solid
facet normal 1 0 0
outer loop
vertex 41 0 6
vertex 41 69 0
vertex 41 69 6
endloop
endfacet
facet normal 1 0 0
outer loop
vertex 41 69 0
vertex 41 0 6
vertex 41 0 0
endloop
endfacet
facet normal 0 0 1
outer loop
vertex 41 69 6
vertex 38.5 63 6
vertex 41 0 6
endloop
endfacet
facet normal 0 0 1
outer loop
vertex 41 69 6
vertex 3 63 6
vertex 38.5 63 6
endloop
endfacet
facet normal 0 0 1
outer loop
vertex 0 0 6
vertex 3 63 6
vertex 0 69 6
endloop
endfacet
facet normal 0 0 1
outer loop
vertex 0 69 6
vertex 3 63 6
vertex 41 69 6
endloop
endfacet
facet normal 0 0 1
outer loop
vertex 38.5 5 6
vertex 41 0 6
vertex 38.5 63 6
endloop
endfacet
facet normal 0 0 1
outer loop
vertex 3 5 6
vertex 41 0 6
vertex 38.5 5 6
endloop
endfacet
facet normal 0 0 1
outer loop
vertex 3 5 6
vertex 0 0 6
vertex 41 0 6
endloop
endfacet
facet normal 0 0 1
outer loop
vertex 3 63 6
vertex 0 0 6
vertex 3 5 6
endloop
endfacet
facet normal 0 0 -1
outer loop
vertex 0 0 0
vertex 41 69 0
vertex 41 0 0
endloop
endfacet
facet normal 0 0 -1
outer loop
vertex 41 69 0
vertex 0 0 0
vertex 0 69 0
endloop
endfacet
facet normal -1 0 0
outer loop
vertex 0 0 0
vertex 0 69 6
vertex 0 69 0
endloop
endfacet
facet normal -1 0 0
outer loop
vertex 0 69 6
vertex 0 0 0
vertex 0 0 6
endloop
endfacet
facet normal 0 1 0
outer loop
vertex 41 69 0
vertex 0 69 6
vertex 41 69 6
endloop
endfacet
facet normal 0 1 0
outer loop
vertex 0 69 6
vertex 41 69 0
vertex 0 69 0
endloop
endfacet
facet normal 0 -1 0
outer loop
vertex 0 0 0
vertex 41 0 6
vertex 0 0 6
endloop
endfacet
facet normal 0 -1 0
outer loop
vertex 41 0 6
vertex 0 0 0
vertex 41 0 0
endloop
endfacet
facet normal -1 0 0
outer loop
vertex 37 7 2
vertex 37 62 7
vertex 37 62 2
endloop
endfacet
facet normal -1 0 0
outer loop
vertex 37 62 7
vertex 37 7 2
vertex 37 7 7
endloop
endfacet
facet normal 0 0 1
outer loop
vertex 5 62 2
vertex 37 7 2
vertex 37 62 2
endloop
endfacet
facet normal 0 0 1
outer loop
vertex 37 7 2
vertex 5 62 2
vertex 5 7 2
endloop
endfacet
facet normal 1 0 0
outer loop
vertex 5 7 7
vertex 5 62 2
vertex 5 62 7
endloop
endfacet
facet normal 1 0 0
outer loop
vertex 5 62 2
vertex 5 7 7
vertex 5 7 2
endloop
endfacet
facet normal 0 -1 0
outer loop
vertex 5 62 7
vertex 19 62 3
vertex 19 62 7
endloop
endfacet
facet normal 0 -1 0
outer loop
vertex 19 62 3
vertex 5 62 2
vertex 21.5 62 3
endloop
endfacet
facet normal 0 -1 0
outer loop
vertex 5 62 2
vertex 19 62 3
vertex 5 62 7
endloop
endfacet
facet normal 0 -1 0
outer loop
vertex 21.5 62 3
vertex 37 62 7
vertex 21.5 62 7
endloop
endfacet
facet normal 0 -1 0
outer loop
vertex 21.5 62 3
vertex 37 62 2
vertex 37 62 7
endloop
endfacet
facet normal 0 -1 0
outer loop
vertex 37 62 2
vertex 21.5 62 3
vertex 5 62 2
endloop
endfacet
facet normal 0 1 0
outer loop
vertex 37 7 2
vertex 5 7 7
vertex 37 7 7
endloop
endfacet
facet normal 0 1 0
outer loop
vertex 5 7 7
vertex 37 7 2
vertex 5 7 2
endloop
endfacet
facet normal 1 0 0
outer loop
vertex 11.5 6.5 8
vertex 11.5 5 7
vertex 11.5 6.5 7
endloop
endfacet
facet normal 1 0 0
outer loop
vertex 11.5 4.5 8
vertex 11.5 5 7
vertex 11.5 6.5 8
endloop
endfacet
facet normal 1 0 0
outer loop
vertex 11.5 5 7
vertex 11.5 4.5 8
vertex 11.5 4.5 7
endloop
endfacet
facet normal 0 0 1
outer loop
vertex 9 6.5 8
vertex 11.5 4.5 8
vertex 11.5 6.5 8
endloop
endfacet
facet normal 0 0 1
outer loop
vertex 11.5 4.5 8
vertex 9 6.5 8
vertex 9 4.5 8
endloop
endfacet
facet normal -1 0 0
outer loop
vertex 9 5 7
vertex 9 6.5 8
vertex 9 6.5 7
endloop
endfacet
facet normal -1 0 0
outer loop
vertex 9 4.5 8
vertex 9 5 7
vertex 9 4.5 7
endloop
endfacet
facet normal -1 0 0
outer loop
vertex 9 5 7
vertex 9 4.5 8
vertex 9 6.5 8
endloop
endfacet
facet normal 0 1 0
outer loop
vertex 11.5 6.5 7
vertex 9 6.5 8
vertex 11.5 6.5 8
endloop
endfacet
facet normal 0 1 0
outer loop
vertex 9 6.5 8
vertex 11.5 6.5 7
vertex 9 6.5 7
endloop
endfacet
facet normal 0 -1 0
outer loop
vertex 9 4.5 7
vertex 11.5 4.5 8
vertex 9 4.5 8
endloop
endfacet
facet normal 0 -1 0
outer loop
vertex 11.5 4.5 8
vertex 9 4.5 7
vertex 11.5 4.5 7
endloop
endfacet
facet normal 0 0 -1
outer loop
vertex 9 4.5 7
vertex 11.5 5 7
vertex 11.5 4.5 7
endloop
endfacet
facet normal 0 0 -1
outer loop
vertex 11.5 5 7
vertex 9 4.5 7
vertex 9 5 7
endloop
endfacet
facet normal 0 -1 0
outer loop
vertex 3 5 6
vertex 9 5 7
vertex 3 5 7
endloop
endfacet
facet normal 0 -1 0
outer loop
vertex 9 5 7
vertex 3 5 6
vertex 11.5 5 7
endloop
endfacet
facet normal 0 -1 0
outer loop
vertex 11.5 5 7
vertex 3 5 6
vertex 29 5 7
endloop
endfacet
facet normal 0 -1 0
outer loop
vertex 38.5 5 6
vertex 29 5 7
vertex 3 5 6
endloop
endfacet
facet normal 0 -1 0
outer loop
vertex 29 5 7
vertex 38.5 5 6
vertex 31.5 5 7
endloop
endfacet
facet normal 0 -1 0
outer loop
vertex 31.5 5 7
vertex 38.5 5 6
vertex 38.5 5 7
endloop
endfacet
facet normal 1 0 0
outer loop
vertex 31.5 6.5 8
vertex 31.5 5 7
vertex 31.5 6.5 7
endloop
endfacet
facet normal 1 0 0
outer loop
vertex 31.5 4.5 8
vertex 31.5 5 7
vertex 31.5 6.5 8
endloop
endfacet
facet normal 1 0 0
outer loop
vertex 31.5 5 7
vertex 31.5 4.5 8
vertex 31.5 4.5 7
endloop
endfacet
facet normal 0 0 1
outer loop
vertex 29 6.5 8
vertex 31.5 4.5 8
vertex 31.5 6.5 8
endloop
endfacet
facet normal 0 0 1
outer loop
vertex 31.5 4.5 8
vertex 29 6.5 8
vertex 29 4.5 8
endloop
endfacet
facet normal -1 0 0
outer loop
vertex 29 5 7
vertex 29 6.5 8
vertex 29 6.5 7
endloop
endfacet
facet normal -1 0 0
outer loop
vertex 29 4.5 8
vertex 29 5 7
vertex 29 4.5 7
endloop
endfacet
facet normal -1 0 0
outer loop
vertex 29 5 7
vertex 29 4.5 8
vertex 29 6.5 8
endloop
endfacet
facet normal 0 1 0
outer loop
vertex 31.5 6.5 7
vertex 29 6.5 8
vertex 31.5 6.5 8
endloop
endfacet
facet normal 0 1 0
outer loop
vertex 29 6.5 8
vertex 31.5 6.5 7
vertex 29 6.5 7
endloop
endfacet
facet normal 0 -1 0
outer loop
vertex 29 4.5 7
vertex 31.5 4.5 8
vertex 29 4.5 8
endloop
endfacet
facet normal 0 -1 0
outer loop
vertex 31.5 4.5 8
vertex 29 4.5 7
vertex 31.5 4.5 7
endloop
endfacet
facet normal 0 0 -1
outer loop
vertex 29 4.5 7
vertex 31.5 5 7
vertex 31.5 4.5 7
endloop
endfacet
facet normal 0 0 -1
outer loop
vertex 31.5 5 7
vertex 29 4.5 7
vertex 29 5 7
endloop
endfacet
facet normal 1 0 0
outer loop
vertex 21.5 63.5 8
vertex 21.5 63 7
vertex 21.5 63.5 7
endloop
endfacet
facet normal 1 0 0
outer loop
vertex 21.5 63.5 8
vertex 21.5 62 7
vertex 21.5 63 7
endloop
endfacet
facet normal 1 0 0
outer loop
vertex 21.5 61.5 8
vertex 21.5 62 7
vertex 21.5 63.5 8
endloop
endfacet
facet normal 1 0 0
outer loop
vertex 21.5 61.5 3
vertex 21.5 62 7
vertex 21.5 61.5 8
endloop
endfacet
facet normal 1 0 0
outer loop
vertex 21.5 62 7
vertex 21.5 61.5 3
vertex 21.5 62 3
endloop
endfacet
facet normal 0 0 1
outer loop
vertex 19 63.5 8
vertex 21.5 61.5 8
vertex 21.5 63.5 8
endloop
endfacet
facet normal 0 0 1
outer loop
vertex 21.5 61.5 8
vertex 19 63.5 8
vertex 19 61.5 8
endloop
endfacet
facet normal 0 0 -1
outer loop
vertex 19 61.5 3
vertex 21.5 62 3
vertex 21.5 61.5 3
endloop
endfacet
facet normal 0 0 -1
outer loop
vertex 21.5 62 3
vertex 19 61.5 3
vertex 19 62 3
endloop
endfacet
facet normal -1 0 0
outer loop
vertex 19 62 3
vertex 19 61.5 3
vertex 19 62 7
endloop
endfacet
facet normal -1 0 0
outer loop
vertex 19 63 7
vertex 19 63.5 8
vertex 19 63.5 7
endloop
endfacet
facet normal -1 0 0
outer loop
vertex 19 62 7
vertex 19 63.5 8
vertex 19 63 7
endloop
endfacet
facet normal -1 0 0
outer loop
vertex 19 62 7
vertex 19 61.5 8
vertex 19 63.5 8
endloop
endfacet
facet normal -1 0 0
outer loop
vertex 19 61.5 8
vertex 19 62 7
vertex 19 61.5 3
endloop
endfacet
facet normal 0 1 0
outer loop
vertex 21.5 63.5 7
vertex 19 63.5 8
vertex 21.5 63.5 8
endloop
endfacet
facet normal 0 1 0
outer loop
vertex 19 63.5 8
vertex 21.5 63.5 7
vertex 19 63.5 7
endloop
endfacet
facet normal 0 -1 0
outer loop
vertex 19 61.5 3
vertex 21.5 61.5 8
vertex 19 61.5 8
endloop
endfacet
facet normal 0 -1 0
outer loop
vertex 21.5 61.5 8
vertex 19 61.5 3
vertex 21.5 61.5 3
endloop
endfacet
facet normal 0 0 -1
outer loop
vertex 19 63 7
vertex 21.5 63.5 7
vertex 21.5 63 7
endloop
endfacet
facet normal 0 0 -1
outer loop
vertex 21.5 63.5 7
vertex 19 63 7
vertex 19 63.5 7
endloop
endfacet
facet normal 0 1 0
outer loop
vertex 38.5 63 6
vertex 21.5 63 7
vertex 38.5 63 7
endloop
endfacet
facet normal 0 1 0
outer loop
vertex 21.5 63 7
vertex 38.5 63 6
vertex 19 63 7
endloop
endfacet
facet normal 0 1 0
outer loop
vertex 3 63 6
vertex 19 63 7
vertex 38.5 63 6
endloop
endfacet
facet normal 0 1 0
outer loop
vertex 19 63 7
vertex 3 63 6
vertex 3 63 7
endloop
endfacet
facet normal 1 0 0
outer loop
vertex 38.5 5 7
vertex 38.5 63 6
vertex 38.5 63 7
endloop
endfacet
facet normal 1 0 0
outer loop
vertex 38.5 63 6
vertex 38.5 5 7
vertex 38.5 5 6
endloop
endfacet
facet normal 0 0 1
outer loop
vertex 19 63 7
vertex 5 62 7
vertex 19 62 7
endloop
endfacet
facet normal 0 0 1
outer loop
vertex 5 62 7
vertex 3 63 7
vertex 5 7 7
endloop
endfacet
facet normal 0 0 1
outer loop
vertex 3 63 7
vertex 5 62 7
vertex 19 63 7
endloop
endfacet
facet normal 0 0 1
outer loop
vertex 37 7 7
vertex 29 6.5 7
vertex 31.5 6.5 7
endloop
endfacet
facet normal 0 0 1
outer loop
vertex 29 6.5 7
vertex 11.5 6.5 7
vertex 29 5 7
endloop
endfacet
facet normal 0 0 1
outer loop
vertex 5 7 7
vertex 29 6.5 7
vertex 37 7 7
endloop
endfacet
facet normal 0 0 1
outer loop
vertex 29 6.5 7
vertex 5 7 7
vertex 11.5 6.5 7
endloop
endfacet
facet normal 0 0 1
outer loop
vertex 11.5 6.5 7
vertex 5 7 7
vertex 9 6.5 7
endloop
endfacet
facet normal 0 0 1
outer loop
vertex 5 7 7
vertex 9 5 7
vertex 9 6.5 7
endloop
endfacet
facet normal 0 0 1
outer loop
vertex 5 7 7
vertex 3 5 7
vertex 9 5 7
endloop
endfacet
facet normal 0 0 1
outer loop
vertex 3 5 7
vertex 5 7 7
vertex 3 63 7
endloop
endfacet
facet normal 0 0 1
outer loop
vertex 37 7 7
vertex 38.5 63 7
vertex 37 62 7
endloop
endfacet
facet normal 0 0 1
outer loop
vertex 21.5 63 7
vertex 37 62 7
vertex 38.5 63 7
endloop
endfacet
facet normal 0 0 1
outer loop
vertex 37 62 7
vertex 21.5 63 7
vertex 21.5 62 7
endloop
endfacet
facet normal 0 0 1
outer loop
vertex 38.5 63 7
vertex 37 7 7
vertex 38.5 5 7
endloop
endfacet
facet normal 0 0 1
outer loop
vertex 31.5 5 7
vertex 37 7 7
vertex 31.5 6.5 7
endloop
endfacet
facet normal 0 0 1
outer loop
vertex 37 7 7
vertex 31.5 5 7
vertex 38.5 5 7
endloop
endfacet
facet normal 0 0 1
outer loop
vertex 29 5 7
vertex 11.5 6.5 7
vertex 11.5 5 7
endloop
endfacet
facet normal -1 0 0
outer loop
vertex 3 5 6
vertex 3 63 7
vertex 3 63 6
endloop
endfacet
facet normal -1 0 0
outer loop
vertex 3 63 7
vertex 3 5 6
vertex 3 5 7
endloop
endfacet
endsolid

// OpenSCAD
/*
    TOS Version 3 Bottom
    

*/

//Body
difference() {
    cube([41,69,6]);
    translate([5,7,2]) {
            cube([32, 55, 5]);
    }    
}

// Clasp front left
difference() {
    translate([9.0,4.5,3]) {
        cube([2.5,2,5]);
    };
    translate([9.0,4.0,0]) {
        cube([5,1,7]);
    }

    
}


 
// Clasp front right
difference() {
    translate([29.0,4.5,3]) {
        cube([2.5,2,5]);
    };
    translate([29.0,4,0]) {
        cube([5,1,7]);
    }
    
}


// Clasp back
difference() {
    translate([19.0,61.5,3]) {
        cube([2.5,2.0,5]);
    };
    translate([19.0,63,0]) {
        cube([5,1,7]);
    }    
}



//Lip
difference() {
    translate([3,5,3]) {
            cube([35.5, 58, 4]);
    }

    translate([5,7,3]) {
            cube([32, 55, 4]);
    }
}
